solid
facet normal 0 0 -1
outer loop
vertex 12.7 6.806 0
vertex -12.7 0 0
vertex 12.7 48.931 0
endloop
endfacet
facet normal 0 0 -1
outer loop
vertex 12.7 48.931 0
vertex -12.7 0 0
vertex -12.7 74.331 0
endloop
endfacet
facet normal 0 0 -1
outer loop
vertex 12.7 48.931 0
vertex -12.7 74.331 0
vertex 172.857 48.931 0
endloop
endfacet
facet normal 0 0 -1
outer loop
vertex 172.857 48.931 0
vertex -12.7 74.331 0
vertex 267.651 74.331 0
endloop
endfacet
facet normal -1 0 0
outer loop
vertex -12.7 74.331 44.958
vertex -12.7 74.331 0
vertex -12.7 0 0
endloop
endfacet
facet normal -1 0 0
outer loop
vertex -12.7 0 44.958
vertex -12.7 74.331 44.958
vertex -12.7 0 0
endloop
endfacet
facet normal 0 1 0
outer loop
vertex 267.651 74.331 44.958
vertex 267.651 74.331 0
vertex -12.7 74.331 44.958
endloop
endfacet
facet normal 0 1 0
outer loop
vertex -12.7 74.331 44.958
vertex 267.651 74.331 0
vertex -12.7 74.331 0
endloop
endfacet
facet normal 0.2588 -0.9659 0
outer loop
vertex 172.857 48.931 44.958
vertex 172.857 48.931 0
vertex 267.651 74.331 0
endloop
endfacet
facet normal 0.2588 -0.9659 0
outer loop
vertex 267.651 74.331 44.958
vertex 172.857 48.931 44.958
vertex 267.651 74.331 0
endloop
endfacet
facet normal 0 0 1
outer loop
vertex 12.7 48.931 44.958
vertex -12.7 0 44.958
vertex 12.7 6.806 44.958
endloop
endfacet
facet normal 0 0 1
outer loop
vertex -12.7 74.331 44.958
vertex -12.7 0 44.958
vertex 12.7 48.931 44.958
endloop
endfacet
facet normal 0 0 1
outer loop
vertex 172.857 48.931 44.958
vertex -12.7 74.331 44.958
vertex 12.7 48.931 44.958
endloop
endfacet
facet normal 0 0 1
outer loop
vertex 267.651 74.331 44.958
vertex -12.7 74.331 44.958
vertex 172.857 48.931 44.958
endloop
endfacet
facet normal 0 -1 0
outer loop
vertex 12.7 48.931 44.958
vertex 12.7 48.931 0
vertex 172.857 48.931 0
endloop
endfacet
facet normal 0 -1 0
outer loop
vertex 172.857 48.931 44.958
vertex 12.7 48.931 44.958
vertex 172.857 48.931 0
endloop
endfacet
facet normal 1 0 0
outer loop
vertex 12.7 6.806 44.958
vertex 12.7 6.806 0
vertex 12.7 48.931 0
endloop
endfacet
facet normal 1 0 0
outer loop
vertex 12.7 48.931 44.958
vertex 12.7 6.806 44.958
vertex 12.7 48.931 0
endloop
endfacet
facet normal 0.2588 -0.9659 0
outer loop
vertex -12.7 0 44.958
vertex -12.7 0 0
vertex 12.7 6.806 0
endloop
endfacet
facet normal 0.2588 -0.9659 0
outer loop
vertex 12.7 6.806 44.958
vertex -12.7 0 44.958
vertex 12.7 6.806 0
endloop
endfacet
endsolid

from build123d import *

# Parameters (mm, degrees)
SKETCH1_W           = 25.4
SKETCH1_H           = 25.4
BOSS_EXTRUDE1_DEPTH = 44.958


with BuildPart() as part:
    # Sketch1 → Boss-Extrude1 (new body)
    with BuildSketch(Plane.XY):
        Polygon((-12.7, 0), (12.7, 6.805909488), (12.7, 48.930936062), (-12.7, 48.930936062), align=None)
        with Locations((0, 61.630936062)):
            Rectangle(SKETCH1_W, SKETCH1_H)
        Polygon((12.7, 74.330936062), (12.7, 48.930936062), (172.856591106, 48.930936062), (267.650681618, 74.330936062), align=None)
    extrude(amount=BOSS_EXTRUDE1_DEPTH)


solid = part.part
